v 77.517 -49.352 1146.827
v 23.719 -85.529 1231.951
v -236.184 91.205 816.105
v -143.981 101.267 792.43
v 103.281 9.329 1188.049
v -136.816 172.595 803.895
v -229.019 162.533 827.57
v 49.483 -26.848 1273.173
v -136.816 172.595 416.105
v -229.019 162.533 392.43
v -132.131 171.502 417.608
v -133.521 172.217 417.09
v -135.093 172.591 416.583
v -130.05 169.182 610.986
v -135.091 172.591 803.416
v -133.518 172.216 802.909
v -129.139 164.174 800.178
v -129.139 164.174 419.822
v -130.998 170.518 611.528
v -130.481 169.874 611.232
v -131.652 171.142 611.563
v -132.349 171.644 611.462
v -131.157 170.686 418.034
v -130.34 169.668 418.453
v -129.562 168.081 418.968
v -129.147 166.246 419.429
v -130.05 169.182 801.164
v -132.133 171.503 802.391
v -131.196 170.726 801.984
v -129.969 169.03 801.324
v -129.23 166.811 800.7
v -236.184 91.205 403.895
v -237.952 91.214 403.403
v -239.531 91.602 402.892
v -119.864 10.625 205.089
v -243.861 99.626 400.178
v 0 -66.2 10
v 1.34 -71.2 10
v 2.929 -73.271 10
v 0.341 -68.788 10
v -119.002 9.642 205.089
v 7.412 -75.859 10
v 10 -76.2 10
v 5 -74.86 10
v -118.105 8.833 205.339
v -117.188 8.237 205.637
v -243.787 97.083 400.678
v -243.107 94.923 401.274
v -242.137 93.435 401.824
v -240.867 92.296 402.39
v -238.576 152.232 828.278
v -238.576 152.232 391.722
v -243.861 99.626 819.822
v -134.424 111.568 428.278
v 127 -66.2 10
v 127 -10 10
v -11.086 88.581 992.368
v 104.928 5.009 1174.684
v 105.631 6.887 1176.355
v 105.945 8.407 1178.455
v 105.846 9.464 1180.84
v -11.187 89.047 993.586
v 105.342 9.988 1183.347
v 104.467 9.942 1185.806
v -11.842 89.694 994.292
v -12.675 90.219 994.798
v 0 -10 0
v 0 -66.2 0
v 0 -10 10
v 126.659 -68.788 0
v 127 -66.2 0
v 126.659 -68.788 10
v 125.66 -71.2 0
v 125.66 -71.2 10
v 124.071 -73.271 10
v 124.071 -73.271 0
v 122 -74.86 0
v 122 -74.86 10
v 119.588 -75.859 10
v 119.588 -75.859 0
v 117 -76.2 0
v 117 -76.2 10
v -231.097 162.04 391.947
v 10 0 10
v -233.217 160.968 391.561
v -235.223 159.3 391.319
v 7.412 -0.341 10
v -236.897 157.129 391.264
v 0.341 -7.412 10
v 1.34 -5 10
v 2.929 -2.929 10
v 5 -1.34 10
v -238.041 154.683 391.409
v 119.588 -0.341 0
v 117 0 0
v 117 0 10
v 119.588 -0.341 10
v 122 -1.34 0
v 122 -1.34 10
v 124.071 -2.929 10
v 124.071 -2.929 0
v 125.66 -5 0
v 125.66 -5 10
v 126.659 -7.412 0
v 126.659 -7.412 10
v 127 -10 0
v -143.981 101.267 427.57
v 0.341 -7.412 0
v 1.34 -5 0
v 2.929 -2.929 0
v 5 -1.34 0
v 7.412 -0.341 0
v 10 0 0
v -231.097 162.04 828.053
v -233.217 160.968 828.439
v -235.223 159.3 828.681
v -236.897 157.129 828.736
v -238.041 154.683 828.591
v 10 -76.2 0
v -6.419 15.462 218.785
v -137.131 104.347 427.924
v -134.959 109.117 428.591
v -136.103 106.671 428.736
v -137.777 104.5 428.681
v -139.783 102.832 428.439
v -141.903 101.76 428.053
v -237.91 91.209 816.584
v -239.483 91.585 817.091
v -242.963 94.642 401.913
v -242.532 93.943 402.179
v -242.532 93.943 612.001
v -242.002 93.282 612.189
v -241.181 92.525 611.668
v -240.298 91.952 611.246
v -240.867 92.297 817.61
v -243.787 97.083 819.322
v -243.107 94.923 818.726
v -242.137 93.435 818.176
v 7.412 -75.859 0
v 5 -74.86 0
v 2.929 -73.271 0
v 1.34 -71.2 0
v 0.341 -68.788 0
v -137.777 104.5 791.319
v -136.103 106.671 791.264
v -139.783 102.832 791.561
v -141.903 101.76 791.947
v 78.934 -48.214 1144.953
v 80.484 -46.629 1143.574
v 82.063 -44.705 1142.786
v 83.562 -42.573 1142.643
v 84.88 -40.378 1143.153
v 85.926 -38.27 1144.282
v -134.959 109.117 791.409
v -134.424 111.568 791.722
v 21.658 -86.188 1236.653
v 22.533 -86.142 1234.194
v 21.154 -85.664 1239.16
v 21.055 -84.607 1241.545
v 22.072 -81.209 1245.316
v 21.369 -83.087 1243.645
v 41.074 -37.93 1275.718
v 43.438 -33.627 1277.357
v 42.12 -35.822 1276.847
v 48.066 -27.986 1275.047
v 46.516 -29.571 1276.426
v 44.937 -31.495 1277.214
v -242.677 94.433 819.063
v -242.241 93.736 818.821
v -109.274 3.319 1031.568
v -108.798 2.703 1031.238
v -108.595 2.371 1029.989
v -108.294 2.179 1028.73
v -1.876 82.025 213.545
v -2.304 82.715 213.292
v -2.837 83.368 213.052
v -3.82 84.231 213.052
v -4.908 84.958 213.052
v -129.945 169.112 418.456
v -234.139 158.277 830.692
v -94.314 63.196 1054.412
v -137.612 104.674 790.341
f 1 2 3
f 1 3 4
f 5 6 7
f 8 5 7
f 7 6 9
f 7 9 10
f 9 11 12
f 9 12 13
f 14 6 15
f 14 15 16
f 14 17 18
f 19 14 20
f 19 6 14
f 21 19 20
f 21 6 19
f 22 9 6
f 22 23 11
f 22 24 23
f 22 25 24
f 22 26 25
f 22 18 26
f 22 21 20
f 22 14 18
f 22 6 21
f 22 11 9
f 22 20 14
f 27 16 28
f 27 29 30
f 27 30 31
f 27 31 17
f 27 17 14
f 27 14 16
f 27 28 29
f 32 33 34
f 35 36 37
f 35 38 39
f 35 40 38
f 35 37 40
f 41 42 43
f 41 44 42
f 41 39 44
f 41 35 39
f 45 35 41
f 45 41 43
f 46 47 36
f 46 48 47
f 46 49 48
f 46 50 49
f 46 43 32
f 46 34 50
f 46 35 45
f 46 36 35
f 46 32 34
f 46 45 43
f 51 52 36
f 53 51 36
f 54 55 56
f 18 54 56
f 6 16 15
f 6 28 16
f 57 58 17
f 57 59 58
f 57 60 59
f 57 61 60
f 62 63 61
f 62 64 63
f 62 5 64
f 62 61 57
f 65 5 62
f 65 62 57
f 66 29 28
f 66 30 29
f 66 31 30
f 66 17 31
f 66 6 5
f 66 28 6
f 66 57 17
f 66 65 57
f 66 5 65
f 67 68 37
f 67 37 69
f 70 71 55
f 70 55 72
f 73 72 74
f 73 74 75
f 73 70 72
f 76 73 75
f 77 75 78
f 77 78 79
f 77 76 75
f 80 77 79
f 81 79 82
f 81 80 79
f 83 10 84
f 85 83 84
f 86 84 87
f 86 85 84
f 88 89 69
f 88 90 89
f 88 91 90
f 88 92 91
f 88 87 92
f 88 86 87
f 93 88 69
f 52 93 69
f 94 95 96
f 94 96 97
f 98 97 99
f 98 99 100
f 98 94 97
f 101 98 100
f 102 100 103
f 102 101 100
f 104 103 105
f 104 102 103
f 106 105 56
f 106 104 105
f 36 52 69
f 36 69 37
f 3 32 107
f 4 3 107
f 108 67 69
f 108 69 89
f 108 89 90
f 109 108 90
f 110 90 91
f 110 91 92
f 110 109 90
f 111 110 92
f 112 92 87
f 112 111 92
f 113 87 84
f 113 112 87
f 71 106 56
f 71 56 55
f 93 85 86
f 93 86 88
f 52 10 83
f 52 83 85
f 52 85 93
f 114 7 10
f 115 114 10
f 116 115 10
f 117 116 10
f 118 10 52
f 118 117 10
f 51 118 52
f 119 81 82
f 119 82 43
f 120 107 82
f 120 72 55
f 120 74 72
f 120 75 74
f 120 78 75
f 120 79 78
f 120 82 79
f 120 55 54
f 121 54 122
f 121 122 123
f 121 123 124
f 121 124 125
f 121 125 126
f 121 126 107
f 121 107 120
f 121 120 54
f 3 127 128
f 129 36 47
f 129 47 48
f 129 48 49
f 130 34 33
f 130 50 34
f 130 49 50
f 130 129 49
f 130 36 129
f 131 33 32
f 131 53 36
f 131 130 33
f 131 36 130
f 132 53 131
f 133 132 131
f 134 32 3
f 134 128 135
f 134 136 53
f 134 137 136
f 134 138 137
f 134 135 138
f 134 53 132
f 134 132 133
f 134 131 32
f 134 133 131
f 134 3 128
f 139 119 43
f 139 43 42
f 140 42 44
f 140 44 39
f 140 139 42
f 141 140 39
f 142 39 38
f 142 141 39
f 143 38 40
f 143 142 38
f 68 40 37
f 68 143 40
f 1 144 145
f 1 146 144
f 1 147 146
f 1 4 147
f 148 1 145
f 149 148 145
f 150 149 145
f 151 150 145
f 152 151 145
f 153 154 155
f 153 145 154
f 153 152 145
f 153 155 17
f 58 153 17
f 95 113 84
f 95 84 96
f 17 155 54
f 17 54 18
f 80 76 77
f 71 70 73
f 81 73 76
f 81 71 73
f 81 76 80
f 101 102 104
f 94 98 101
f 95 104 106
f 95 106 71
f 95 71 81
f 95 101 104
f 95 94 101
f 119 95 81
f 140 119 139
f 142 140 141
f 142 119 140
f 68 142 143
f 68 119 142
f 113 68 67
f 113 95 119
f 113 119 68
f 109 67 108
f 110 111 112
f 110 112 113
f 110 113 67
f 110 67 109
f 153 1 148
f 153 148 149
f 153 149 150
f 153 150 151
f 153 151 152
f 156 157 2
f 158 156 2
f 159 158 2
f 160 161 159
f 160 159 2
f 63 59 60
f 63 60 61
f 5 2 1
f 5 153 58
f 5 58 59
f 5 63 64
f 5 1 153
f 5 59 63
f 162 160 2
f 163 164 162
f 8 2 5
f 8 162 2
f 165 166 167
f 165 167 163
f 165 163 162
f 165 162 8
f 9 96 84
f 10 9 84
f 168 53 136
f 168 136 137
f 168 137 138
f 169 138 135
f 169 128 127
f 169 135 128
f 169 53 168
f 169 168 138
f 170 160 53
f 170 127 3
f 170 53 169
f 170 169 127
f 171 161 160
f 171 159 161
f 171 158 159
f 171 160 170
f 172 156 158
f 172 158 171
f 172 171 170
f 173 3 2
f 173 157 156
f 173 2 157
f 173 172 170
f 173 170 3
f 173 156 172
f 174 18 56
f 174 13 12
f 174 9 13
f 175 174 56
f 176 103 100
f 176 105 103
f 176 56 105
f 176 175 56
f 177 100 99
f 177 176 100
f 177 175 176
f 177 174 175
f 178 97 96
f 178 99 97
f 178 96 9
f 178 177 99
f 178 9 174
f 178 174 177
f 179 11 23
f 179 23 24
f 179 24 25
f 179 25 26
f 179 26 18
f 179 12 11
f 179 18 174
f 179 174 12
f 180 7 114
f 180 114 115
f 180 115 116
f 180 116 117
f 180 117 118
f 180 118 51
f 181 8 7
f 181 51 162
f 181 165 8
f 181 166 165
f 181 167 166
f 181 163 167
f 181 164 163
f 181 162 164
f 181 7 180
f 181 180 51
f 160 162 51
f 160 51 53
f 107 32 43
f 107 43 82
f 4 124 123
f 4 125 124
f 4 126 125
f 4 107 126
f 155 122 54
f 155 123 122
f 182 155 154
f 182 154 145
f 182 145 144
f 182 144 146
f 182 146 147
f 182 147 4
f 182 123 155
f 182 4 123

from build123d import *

# Parameters (mm, degrees)
SALIENTE_EXTRUIR1_DEPTH = 10


with BuildPart() as part:
    # Croquis1 → Saliente-Extruir1 (new body)
    with BuildSketch(Plane.XY):
        with BuildLine():
            Line((10, 0), (117, 0))
            ThreePointArc((117, 0), (124.071067812, -2.928932188), (127, -10))
            Line((127, -10), (127, -66.2))
            ThreePointArc((127, -66.2), (124.071067812, -73.271067812), (117, -76.2))
            Line((117, -76.2), (10, -76.2))
            ThreePointArc((10, -76.2), (2.928932188, -73.271067812), (0, -66.2))
            Line((0, -66.2), (0, -10))
            ThreePointArc((0, -10), (2.928932188, -2.928932188), (10, 0))
        make_face()
    extrude(amount=SALIENTE_EXTRUIR1_DEPTH)

    # Barrer1: sweep along a curve in space
    with BuildLine() as barrer1_path:
        Line((-186.5, 131.9, 810), (63.5, -38.1, 1210))
        Line((-186.5, 131.9, 410), (-186.5, 131.9, 810))
        Line((-186.5, 131.9, 410), (63.5, -38.1, 10))
    # Croquis2 → Barrer1 (sweep)
    with BuildSketch(Plane.XY.offset(10)):
        with BuildLine():
            Line((10, -76.2), (117, -76.2))
            ThreePointArc((117, -76.2), (124.071067812, -73.271067812), (127, -66.2))
            Line((127, -66.2), (127, -10))
            ThreePointArc((127, -10), (124.071067812, -2.928932188), (117, 0))
            Line((117, 0), (10, 0))
            ThreePointArc((10, 0), (2.928932188, -2.928932188), (0, -10))
            Line((0, -10), (0, -66.2))
            ThreePointArc((0, -66.2), (2.928932188, -73.271067812), (10, -76.2))
        make_face()
    sweep(path=barrer1_path.line, transition=Transition.RIGHT)


solid = part.part
